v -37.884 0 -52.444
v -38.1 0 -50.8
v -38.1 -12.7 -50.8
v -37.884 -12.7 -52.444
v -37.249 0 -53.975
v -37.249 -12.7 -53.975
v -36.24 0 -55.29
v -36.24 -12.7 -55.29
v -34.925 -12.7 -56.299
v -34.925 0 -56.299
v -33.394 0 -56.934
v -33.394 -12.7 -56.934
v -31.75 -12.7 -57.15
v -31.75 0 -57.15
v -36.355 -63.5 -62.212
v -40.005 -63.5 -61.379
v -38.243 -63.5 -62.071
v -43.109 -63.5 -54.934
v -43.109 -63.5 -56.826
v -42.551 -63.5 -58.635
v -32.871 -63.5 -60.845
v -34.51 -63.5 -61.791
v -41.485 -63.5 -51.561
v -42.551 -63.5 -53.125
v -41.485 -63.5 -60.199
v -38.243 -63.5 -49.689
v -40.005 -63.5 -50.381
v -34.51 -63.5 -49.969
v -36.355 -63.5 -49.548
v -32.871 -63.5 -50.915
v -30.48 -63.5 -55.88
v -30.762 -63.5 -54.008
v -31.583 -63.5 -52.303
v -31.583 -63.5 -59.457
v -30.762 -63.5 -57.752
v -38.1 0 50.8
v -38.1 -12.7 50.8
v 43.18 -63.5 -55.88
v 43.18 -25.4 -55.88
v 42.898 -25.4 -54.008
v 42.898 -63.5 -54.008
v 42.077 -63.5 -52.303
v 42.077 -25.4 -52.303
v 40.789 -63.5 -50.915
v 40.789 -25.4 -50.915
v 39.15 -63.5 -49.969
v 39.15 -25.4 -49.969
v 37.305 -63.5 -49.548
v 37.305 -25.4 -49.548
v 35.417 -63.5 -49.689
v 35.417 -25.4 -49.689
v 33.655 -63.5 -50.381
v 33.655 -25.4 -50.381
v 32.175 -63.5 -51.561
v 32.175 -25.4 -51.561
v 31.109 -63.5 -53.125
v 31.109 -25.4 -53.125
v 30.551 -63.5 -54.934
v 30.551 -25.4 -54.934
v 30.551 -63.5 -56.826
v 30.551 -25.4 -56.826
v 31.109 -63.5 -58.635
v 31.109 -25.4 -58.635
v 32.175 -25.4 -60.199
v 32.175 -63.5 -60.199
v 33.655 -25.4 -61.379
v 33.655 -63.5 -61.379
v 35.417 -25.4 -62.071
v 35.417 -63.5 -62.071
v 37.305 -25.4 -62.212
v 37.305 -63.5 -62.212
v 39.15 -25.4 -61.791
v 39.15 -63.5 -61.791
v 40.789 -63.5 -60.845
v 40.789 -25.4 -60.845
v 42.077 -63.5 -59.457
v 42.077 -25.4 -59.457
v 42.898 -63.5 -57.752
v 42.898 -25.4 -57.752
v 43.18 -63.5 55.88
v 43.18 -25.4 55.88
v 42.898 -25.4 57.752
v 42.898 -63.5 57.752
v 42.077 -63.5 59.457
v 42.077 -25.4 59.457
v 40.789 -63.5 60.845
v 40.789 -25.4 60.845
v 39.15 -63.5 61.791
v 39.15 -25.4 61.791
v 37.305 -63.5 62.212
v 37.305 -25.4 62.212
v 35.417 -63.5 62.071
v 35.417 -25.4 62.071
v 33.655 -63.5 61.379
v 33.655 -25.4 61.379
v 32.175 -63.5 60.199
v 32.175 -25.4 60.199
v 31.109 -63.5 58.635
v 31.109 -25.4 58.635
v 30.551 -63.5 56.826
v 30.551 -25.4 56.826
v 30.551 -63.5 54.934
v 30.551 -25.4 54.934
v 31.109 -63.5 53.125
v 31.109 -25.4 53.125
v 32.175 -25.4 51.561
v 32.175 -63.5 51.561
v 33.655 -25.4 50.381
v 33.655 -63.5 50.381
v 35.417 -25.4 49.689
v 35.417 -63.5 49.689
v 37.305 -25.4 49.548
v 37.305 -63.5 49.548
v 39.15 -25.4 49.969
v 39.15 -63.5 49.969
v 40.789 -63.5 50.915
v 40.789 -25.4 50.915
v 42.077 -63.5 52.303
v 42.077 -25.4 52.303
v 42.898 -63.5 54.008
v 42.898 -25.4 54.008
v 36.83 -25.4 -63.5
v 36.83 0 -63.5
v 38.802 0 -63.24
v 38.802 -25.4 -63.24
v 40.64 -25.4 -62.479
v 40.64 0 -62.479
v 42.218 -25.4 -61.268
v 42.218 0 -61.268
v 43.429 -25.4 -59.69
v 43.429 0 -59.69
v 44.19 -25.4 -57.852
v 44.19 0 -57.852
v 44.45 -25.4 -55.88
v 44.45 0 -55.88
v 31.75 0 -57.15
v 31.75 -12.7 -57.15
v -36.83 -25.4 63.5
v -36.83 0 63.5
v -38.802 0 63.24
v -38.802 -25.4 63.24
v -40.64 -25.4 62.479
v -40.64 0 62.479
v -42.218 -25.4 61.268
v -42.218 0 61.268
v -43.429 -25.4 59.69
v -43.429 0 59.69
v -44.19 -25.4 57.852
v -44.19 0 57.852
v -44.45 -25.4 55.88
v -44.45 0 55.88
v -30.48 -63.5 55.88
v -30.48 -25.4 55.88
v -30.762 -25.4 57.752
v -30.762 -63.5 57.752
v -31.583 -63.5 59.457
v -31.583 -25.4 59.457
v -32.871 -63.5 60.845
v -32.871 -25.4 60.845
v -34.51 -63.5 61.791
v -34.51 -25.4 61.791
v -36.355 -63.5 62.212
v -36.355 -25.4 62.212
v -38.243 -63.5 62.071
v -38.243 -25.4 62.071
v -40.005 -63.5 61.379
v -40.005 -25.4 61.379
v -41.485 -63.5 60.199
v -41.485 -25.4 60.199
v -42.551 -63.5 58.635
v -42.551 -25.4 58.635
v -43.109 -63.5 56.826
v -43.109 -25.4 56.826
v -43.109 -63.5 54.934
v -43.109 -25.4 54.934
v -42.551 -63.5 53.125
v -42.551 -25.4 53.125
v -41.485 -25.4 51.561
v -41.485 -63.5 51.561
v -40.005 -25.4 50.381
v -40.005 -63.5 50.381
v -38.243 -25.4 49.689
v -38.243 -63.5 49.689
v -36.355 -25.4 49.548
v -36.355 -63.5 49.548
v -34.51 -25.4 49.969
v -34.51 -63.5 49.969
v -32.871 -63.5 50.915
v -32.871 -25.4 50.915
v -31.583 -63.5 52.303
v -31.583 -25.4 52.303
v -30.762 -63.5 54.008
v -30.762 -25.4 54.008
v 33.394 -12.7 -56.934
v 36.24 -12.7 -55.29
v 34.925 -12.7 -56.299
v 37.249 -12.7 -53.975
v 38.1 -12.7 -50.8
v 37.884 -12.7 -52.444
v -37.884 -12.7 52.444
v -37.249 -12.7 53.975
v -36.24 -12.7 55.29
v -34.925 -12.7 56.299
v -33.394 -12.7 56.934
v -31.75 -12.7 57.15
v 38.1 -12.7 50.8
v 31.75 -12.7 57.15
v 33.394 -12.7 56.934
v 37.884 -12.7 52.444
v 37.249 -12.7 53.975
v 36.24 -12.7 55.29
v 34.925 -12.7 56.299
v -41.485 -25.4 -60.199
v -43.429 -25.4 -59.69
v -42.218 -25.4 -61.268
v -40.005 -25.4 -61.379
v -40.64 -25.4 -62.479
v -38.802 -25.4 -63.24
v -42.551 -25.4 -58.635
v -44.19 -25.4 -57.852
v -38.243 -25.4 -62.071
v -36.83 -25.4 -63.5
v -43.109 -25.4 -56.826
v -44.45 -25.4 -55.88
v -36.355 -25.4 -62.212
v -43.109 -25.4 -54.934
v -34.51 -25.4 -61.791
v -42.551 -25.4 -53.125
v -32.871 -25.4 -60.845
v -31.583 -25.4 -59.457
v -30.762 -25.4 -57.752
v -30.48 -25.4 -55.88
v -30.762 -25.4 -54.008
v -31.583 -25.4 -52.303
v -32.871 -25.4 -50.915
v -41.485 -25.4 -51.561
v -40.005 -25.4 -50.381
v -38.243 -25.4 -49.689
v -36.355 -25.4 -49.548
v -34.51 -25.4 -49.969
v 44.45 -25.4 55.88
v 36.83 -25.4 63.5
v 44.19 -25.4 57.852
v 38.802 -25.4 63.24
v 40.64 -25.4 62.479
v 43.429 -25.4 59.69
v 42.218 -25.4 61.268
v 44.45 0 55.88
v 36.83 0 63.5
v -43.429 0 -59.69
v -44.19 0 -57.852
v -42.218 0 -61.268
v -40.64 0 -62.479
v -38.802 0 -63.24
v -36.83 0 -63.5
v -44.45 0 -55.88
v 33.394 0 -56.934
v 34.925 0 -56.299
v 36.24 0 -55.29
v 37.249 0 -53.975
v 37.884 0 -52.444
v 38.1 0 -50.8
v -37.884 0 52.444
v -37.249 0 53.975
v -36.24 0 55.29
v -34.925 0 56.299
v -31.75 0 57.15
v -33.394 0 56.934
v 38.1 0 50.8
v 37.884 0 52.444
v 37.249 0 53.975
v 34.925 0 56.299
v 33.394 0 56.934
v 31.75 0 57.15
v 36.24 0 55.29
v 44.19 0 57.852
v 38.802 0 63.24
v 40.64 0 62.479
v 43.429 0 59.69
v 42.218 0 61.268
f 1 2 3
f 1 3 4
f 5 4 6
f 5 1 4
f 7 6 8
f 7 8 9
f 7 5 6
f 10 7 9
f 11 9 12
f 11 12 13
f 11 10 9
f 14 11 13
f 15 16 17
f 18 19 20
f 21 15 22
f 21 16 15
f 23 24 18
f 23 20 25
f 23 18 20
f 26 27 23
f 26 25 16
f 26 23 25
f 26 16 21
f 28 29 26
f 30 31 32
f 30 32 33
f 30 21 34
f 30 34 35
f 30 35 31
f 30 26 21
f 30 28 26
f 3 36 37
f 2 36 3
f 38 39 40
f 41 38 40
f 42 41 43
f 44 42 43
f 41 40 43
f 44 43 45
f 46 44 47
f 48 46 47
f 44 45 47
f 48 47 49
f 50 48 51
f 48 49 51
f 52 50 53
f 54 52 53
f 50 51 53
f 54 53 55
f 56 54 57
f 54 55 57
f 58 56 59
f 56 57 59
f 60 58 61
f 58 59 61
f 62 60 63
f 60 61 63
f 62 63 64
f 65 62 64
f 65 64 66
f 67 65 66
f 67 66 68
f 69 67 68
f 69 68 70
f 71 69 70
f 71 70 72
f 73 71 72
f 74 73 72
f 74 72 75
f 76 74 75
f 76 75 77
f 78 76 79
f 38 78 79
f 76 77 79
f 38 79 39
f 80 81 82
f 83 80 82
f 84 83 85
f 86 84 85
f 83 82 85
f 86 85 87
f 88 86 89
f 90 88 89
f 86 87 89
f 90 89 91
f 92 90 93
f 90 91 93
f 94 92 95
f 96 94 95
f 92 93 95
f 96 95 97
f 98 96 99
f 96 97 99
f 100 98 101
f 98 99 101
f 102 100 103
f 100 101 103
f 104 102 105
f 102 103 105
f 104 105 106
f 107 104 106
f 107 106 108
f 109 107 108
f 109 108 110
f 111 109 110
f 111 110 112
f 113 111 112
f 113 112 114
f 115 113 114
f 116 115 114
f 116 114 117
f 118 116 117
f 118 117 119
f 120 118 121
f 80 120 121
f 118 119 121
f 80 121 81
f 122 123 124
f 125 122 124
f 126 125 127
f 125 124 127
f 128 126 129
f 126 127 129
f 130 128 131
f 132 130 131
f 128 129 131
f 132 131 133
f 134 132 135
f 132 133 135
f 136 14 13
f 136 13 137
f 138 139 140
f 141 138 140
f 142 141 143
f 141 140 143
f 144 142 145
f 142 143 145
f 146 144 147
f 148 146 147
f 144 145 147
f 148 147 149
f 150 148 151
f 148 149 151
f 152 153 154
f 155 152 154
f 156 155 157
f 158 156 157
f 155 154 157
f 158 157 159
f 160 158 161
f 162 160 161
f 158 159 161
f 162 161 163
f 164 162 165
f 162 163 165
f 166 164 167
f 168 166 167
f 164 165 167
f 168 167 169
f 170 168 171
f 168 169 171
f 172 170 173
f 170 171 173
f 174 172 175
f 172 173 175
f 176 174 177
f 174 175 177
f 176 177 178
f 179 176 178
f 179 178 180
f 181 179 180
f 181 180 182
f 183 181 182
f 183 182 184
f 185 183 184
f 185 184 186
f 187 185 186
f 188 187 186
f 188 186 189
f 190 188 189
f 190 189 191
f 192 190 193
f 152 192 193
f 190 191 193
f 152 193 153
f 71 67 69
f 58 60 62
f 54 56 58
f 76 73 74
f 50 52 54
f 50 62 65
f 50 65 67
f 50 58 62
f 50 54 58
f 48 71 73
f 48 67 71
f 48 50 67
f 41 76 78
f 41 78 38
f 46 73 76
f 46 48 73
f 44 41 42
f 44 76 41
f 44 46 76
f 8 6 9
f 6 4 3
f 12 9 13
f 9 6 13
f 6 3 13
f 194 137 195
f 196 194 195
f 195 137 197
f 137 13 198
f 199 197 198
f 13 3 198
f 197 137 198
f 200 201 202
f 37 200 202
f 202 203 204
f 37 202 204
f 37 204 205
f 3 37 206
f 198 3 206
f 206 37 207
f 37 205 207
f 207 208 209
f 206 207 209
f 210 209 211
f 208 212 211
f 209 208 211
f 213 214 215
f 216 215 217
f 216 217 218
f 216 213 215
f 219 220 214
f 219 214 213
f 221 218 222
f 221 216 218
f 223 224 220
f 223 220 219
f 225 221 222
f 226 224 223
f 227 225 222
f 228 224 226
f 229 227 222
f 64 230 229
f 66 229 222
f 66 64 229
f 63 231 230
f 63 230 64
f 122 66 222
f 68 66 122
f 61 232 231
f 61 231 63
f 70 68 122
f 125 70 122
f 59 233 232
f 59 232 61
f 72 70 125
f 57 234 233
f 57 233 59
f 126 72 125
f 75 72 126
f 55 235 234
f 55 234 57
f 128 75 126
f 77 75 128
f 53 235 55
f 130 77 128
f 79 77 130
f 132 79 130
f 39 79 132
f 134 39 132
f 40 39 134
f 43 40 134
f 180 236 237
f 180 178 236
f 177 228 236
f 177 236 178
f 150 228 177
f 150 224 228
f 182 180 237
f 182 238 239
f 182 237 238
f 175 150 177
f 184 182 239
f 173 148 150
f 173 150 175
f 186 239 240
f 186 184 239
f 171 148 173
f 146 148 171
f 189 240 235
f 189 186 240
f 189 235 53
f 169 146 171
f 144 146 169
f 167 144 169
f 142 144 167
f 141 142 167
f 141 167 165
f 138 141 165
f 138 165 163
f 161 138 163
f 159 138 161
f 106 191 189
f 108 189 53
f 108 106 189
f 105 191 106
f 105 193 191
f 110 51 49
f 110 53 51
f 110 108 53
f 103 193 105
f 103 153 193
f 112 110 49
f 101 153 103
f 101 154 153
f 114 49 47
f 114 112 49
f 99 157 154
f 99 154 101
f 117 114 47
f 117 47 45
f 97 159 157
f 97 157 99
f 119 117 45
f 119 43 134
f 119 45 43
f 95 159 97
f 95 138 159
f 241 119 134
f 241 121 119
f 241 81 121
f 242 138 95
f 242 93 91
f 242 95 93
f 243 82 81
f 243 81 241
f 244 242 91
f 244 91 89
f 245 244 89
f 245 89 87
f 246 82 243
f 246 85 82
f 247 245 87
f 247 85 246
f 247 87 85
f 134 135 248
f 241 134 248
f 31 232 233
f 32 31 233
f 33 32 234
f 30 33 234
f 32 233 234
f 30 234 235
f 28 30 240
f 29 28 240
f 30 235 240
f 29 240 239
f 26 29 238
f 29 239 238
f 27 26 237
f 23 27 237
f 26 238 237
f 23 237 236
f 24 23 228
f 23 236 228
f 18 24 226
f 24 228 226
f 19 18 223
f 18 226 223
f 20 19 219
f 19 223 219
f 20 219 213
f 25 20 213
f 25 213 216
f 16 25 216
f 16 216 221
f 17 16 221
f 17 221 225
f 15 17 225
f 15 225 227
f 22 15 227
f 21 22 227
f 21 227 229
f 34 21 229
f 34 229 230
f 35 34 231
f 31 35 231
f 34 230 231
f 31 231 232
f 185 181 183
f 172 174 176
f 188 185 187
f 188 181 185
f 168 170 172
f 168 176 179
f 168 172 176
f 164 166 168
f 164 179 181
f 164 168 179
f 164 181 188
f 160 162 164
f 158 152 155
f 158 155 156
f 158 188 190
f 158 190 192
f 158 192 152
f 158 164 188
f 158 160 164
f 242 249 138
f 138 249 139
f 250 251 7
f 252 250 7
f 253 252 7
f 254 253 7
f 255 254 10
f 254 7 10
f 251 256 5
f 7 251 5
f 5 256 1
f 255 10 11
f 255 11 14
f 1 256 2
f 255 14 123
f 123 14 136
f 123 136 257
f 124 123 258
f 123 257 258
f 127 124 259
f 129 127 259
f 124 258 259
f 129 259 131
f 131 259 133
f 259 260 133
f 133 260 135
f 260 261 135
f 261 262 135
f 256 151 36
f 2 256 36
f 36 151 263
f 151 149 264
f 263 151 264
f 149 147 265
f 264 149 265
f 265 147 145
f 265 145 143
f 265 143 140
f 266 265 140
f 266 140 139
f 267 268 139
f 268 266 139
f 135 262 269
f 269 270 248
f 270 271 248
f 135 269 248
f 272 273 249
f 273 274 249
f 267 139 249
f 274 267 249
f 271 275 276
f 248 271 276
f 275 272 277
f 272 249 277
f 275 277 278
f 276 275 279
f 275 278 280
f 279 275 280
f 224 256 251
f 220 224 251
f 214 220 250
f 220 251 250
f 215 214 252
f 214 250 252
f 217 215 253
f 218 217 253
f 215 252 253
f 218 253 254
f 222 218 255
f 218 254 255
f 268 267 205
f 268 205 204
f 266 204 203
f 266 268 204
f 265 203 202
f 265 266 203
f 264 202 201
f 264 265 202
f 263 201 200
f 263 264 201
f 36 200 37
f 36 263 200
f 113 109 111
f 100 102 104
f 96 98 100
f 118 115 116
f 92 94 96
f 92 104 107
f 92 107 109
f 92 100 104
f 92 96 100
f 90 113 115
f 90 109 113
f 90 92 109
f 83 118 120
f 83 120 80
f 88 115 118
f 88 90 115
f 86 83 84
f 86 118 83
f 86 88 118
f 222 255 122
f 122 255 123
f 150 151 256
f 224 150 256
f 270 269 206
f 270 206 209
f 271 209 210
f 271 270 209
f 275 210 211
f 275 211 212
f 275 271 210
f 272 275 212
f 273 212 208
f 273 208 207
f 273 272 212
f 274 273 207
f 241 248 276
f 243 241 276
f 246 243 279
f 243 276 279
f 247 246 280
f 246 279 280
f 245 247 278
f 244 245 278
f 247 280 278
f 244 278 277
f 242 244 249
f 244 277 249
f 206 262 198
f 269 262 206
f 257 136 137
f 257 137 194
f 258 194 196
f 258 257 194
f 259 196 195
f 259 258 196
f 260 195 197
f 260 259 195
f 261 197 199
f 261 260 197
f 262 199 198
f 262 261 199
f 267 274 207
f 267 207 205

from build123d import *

# Parameters (mm, degrees)
F1_DEPTH = 25.4
F2_DEPTH = 12.7
F3_R     = 6.35
F4_DEPTH = 38.1


with BuildPart() as f1:
    # F0 (on Front) → F1 (new body)
    with BuildSketch(Plane.XZ):
        with BuildLine():
            ThreePointArc((44.45, 55.88), (42.218154, 61.268154), (36.83, 63.5))
            Line((36.83, 63.5), (-36.83, 63.5))
            ThreePointArc((-36.83, 63.5), (-42.218154, 61.268154), (-44.45, 55.88))
            Line((-44.45, 55.88), (-44.45, -55.88))
            ThreePointArc((-44.45, -55.88), (-42.218154, -61.268154), (-36.83, -63.5))
            Line((-36.83, -63.5), (36.83, -63.5))
            ThreePointArc((36.83, -63.5), (42.218154, -61.268154), (44.45, -55.88))
            Line((44.45, -55.88), (44.45, 55.88))
        make_face()
        with BuildLine():
            Line((-31.75, 57.15), (31.75, 57.15))
            ThreePointArc((31.75, 57.15), (36.240128, 55.290128), (38.1, 50.8))
            Line((38.1, 50.8), (38.1, -50.8))
            ThreePointArc((38.1, -50.8), (36.240128, -55.290128), (31.75, -57.15))
            Line((31.75, -57.15), (-31.75, -57.15))
            ThreePointArc((-31.75, -57.15), (-36.240128, -55.290128), (-38.1, -50.8))
            Line((-38.1, -50.8), (-38.1, 50.8))
            ThreePointArc((-38.1, 50.8), (-36.240128, 55.290128), (-31.75, 57.15))
        make_face(mode=Mode.SUBTRACT)
        with BuildLine():
            ThreePointArc((38.1, 50.8), (36.240128, 55.290128), (31.75, 57.15))
            Line((31.75, 57.15), (-31.75, 57.15))
            ThreePointArc((-31.75, 57.15), (-36.240128, 55.290128), (-38.1, 50.8))
            Line((-38.1, 50.8), (-38.1, -50.8))
            ThreePointArc((-38.1, -50.8), (-36.240128, -55.290128), (-31.75, -57.15))
            Line((-31.75, -57.15), (31.75, -57.15))
            ThreePointArc((31.75, -57.15), (36.240128, -55.290128), (38.1, -50.8))
            Line((38.1, -50.8), (38.1, 50.8))
        make_face()
    extrude(amount=F1_DEPTH)

    # F0 (on Front) → F2 (cut)
    with BuildSketch(Plane.XZ):
        with BuildLine():
            ThreePointArc((38.1, 50.8), (36.240128, 55.290128), (31.75, 57.15))
            Line((31.75, 57.15), (-31.75, 57.15))
            ThreePointArc((-31.75, 57.15), (-36.240128, 55.290128), (-38.1, 50.8))
            Line((-38.1, 50.8), (-38.1, -50.8))
            ThreePointArc((-38.1, -50.8), (-36.240128, -55.290128), (-31.75, -57.15))
            Line((-31.75, -57.15), (31.75, -57.15))
            ThreePointArc((31.75, -57.15), (36.240128, -55.290128), (38.1, -50.8))
            Line((38.1, -50.8), (38.1, 50.8))
        make_face()
    extrude(amount=F2_DEPTH, mode=Mode.SUBTRACT)

    # F3 (on face) → F4 (join)
    with BuildSketch(Plane.XZ.offset(25.4)):
        with Locations((-36.83, 55.88)):
            Circle(F3_R)
        with Locations((36.83, 55.88)):
            Circle(F3_R)
        with Locations((-36.83, -55.88)):
            Circle(F3_R)
        with Locations((36.83, -55.88)):
            Circle(F3_R)
    extrude(amount=F4_DEPTH)


solid = f1.part
